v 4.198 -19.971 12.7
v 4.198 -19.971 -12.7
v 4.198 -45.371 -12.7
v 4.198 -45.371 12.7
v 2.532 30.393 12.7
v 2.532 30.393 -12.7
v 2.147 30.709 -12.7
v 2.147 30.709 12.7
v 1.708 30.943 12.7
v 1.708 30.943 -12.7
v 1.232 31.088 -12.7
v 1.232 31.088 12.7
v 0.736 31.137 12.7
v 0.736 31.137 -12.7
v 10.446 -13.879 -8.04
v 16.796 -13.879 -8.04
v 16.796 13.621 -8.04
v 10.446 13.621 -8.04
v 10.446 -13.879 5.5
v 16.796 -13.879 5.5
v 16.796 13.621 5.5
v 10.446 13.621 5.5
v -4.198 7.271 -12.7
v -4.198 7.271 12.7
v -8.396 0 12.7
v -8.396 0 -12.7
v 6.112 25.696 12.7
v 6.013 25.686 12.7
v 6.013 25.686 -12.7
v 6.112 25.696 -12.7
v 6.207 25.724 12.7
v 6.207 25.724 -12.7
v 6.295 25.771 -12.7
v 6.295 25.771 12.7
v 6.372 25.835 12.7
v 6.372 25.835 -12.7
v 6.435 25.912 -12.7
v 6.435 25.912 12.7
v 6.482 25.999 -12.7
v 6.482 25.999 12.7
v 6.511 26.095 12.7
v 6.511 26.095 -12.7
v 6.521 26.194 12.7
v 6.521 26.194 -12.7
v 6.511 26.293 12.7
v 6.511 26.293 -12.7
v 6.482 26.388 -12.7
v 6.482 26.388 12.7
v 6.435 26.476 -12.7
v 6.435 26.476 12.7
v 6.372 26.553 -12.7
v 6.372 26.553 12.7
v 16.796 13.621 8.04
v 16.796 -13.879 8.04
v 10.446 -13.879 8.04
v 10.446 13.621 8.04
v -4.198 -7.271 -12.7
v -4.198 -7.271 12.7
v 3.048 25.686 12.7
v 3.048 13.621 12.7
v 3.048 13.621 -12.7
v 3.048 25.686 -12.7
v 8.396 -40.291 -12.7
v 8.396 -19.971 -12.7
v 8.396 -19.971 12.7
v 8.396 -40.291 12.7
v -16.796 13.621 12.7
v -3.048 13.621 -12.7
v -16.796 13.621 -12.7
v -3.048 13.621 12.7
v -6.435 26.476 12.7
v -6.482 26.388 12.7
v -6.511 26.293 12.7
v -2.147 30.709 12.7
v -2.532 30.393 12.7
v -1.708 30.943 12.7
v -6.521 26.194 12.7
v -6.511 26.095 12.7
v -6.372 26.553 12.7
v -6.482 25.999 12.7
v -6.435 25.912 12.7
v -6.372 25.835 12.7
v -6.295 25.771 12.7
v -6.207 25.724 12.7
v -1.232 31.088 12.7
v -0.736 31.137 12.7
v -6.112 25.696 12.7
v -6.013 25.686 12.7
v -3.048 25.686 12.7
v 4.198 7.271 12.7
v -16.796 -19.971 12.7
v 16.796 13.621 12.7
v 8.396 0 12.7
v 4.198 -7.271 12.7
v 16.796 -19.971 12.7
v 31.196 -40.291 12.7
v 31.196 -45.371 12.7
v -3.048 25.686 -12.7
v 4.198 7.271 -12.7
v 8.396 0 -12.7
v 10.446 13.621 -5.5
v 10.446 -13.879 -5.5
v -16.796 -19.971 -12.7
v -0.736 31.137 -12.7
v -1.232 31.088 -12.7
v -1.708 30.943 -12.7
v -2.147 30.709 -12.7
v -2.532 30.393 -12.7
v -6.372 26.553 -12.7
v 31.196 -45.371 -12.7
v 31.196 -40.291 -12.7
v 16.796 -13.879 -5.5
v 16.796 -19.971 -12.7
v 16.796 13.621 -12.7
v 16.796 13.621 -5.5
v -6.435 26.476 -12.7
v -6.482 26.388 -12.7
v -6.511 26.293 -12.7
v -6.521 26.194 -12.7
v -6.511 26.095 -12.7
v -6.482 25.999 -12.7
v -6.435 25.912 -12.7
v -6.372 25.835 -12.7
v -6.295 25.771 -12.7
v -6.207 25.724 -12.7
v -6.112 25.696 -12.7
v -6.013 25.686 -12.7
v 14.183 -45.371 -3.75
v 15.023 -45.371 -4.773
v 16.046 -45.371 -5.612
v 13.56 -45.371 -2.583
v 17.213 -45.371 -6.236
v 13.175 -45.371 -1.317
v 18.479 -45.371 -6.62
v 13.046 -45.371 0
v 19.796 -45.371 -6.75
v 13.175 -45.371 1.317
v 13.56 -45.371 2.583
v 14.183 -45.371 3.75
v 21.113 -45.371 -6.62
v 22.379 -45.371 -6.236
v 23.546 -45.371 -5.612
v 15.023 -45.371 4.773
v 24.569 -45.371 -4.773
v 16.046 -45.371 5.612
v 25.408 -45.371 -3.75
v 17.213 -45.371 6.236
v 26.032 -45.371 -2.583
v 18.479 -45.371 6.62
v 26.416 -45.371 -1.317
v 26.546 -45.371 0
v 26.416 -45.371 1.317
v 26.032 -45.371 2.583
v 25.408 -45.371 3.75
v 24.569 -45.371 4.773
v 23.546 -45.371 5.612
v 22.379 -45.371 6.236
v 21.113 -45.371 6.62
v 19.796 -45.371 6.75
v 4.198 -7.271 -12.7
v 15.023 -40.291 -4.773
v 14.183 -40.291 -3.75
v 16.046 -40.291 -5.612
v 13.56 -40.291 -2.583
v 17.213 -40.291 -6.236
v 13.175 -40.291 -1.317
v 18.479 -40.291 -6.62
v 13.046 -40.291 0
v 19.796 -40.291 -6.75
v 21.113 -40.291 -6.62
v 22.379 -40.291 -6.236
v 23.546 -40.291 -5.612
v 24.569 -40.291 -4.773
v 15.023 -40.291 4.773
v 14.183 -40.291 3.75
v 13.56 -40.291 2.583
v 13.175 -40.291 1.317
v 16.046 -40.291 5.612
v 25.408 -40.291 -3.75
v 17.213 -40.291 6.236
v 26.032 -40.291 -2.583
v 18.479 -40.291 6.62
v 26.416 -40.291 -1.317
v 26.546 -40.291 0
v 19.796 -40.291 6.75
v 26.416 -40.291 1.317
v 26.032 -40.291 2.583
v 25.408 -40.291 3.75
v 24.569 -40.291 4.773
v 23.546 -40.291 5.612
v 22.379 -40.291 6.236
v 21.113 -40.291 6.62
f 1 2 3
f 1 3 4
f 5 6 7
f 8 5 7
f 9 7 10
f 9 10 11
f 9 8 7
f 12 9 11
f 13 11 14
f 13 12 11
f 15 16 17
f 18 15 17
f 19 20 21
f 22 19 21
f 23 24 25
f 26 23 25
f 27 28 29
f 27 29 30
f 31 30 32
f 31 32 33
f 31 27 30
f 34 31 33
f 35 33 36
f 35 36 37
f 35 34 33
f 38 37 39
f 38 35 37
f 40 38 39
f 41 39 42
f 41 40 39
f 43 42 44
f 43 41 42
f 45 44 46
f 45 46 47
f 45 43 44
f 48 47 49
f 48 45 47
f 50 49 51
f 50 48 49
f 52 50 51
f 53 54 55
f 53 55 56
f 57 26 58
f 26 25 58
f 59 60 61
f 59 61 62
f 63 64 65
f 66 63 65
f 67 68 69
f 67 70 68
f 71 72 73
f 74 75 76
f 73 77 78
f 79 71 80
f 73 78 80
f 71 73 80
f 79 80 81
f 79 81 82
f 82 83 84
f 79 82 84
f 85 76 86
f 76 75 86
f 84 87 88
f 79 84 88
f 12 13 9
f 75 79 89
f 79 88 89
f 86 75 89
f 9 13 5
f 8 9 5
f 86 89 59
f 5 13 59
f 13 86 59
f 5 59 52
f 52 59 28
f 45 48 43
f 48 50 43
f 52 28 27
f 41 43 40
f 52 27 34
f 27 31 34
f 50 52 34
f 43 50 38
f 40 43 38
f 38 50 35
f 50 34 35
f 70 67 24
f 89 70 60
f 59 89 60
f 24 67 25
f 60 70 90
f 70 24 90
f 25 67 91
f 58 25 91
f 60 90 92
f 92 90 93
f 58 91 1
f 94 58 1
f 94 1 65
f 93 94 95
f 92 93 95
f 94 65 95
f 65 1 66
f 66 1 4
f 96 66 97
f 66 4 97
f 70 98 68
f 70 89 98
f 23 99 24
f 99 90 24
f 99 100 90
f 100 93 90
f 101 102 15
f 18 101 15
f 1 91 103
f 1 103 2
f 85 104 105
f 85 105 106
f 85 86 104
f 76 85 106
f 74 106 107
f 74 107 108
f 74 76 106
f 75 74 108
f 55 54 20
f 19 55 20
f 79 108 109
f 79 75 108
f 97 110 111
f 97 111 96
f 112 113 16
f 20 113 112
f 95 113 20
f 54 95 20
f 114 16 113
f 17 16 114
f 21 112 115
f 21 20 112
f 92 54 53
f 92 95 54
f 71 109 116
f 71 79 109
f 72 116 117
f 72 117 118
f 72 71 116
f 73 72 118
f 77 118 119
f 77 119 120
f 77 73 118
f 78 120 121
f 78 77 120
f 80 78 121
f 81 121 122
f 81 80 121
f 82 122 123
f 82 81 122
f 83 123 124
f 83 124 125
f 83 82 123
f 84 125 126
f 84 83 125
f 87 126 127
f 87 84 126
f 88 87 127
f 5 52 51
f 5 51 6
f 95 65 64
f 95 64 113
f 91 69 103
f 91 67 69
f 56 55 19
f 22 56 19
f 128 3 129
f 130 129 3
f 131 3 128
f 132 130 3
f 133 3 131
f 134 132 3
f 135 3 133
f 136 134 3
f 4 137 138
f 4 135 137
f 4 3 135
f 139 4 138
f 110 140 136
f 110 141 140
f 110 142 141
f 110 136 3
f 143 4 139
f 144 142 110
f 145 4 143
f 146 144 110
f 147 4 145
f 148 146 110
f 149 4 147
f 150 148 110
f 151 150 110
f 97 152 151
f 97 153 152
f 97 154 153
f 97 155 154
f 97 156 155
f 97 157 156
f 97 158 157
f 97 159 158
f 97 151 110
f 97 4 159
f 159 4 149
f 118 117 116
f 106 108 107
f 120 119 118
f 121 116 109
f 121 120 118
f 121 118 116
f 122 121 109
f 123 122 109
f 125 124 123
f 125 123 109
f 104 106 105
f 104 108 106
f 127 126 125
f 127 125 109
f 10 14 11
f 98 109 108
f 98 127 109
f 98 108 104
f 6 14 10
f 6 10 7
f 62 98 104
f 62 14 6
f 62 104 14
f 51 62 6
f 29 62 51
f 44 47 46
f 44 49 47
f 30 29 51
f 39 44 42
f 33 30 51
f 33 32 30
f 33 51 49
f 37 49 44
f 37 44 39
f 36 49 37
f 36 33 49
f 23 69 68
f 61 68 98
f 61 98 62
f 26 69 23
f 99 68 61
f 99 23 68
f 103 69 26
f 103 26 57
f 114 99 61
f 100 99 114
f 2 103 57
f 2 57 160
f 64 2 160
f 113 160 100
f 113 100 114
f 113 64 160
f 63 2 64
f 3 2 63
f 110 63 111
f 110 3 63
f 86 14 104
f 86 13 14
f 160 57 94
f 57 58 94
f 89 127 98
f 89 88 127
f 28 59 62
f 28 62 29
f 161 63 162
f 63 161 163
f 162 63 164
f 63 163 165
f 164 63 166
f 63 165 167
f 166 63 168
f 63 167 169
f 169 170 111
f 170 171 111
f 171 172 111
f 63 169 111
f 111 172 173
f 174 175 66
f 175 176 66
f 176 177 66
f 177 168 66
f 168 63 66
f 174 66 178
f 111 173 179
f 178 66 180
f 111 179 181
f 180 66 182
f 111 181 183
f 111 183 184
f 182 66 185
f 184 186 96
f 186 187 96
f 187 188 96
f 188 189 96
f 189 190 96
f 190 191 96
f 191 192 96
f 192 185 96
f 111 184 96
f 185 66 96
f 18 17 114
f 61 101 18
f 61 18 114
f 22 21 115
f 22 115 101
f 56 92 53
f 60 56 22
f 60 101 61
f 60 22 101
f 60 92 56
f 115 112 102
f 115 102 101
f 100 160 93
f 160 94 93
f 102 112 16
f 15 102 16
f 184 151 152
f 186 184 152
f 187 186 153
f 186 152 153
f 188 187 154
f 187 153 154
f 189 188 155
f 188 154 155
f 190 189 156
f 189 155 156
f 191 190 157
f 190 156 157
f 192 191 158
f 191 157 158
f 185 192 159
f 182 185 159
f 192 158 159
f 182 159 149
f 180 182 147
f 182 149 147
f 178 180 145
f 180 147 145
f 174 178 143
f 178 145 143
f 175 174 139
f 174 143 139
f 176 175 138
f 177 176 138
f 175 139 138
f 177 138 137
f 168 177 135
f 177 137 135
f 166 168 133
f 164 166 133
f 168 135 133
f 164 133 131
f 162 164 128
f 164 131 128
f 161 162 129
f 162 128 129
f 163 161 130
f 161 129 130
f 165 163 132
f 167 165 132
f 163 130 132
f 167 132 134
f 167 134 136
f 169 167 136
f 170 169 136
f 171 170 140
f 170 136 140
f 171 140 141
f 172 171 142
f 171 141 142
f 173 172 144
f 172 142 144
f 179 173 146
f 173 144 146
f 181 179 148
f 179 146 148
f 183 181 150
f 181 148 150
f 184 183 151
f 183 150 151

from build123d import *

# Parameters (mm, degrees)
BOSS_EXTRUDE1_DEPTH = 12.7
SKETCH8_W           = 2.54
SKETCH8_H           = 27.5
CUT_EXTRUDE1_DEPTH  = 6.35
SKETCH3_W           = 4.197769469
SKETCH3_H           = 25.4
BOSS_EXTRUDE2_DEPTH = 25.4
SKETCH4_W           = 22.800422122
SKETCH4_H           = 25.4
SKETCH4_R           = 6.75
BOSS_EXTRUDE3_DEPTH = 5.08


with BuildPart() as part:
    # Sketch1 → Boss-Extrude1 (new body, symmetric)
    with BuildSketch(Plane.XY):
        with BuildLine():
            Line((-16.79575, 13.62075), (-16.79575, -19.97075))
            Line((-16.79575, -19.97075), (16.79575, -19.97075))
            Line((16.79575, -19.97075), (16.79575, 13.62075))
            Line((16.79575, 13.62075), (3.048, 13.62075))
            Line((3.048, 13.62075), (3.048, 25.68575))
            Line((3.048, 25.68575), (6.01257951, 25.68575))
            ThreePointArc((6.01257951, 25.68575), (6.481910313, 25.999346816), (6.371789755, 26.552960245))
            Line((6.371789755, 26.552960245), (2.532108776, 30.392641224))
            ThreePointArc((2.532108776, 30.392641224), (1.70807347, 30.943244013), (0.736057552, 31.13659))
            Line((0.736057552, 31.13659), (-0.736057552, 31.13659))
            ThreePointArc((-0.736057552, 31.13659), (-1.70807347, 30.943244013), (-2.532108776, 30.392641224))
            Line((-2.532108776, 30.392641224), (-6.371789755, 26.552960245))
            ThreePointArc((-6.371789755, 26.552960245), (-6.481910313, 25.999346816), (-6.01257951, 25.68575))
            Line((-6.01257951, 25.68575), (-3.048, 25.68575))
            Line((-3.048, 25.68575), (-3.048, 13.62075))
            Line((-3.048, 13.62075), (-16.79575, 13.62075))
        make_face()
        Polygon((-4.19776947, 7.27075), (-8.395538939, 0), (-4.19776947, -7.27075), (4.19776947, -7.27075), (8.395538939, 0), (4.19776947, 7.27075), align=None, mode=Mode.SUBTRACT)
    extrude(amount=BOSS_EXTRUDE1_DEPTH, both=True)

    # Sketch8 → Cut-Extrude1 (cut)
    with BuildSketch(Plane(origin=(16.79575, 0, 0), x_dir=(0, 0, -1), z_dir=(1, 0, 0))):
        with Locations((-6.77, -0.12925)):
            Rectangle(SKETCH8_W, SKETCH8_H)
        with Locations((6.77, -0.12925)):
            Rectangle(SKETCH8_W, SKETCH8_H)
    extrude(amount=-CUT_EXTRUDE1_DEPTH, mode=Mode.SUBTRACT)

    # Sketch3 → Boss-Extrude2 (add)
    with BuildSketch(Plane.XZ.offset(19.97075)):
        with Locations((6.296654204, 0)):
            Rectangle(SKETCH3_W, SKETCH3_H)
    extrude(amount=BOSS_EXTRUDE2_DEPTH)

    # Sketch4 → Boss-Extrude3 (add)
    with BuildSketch(Plane.XZ.offset(45.37075)):
        with Locations((19.79575, 0)):
            Rectangle(SKETCH4_W, SKETCH4_H)
        with Locations((19.79575, 0)):
            Circle(SKETCH4_R, mode=Mode.SUBTRACT)
    extrude(amount=-BOSS_EXTRUDE3_DEPTH)


solid = part.part
